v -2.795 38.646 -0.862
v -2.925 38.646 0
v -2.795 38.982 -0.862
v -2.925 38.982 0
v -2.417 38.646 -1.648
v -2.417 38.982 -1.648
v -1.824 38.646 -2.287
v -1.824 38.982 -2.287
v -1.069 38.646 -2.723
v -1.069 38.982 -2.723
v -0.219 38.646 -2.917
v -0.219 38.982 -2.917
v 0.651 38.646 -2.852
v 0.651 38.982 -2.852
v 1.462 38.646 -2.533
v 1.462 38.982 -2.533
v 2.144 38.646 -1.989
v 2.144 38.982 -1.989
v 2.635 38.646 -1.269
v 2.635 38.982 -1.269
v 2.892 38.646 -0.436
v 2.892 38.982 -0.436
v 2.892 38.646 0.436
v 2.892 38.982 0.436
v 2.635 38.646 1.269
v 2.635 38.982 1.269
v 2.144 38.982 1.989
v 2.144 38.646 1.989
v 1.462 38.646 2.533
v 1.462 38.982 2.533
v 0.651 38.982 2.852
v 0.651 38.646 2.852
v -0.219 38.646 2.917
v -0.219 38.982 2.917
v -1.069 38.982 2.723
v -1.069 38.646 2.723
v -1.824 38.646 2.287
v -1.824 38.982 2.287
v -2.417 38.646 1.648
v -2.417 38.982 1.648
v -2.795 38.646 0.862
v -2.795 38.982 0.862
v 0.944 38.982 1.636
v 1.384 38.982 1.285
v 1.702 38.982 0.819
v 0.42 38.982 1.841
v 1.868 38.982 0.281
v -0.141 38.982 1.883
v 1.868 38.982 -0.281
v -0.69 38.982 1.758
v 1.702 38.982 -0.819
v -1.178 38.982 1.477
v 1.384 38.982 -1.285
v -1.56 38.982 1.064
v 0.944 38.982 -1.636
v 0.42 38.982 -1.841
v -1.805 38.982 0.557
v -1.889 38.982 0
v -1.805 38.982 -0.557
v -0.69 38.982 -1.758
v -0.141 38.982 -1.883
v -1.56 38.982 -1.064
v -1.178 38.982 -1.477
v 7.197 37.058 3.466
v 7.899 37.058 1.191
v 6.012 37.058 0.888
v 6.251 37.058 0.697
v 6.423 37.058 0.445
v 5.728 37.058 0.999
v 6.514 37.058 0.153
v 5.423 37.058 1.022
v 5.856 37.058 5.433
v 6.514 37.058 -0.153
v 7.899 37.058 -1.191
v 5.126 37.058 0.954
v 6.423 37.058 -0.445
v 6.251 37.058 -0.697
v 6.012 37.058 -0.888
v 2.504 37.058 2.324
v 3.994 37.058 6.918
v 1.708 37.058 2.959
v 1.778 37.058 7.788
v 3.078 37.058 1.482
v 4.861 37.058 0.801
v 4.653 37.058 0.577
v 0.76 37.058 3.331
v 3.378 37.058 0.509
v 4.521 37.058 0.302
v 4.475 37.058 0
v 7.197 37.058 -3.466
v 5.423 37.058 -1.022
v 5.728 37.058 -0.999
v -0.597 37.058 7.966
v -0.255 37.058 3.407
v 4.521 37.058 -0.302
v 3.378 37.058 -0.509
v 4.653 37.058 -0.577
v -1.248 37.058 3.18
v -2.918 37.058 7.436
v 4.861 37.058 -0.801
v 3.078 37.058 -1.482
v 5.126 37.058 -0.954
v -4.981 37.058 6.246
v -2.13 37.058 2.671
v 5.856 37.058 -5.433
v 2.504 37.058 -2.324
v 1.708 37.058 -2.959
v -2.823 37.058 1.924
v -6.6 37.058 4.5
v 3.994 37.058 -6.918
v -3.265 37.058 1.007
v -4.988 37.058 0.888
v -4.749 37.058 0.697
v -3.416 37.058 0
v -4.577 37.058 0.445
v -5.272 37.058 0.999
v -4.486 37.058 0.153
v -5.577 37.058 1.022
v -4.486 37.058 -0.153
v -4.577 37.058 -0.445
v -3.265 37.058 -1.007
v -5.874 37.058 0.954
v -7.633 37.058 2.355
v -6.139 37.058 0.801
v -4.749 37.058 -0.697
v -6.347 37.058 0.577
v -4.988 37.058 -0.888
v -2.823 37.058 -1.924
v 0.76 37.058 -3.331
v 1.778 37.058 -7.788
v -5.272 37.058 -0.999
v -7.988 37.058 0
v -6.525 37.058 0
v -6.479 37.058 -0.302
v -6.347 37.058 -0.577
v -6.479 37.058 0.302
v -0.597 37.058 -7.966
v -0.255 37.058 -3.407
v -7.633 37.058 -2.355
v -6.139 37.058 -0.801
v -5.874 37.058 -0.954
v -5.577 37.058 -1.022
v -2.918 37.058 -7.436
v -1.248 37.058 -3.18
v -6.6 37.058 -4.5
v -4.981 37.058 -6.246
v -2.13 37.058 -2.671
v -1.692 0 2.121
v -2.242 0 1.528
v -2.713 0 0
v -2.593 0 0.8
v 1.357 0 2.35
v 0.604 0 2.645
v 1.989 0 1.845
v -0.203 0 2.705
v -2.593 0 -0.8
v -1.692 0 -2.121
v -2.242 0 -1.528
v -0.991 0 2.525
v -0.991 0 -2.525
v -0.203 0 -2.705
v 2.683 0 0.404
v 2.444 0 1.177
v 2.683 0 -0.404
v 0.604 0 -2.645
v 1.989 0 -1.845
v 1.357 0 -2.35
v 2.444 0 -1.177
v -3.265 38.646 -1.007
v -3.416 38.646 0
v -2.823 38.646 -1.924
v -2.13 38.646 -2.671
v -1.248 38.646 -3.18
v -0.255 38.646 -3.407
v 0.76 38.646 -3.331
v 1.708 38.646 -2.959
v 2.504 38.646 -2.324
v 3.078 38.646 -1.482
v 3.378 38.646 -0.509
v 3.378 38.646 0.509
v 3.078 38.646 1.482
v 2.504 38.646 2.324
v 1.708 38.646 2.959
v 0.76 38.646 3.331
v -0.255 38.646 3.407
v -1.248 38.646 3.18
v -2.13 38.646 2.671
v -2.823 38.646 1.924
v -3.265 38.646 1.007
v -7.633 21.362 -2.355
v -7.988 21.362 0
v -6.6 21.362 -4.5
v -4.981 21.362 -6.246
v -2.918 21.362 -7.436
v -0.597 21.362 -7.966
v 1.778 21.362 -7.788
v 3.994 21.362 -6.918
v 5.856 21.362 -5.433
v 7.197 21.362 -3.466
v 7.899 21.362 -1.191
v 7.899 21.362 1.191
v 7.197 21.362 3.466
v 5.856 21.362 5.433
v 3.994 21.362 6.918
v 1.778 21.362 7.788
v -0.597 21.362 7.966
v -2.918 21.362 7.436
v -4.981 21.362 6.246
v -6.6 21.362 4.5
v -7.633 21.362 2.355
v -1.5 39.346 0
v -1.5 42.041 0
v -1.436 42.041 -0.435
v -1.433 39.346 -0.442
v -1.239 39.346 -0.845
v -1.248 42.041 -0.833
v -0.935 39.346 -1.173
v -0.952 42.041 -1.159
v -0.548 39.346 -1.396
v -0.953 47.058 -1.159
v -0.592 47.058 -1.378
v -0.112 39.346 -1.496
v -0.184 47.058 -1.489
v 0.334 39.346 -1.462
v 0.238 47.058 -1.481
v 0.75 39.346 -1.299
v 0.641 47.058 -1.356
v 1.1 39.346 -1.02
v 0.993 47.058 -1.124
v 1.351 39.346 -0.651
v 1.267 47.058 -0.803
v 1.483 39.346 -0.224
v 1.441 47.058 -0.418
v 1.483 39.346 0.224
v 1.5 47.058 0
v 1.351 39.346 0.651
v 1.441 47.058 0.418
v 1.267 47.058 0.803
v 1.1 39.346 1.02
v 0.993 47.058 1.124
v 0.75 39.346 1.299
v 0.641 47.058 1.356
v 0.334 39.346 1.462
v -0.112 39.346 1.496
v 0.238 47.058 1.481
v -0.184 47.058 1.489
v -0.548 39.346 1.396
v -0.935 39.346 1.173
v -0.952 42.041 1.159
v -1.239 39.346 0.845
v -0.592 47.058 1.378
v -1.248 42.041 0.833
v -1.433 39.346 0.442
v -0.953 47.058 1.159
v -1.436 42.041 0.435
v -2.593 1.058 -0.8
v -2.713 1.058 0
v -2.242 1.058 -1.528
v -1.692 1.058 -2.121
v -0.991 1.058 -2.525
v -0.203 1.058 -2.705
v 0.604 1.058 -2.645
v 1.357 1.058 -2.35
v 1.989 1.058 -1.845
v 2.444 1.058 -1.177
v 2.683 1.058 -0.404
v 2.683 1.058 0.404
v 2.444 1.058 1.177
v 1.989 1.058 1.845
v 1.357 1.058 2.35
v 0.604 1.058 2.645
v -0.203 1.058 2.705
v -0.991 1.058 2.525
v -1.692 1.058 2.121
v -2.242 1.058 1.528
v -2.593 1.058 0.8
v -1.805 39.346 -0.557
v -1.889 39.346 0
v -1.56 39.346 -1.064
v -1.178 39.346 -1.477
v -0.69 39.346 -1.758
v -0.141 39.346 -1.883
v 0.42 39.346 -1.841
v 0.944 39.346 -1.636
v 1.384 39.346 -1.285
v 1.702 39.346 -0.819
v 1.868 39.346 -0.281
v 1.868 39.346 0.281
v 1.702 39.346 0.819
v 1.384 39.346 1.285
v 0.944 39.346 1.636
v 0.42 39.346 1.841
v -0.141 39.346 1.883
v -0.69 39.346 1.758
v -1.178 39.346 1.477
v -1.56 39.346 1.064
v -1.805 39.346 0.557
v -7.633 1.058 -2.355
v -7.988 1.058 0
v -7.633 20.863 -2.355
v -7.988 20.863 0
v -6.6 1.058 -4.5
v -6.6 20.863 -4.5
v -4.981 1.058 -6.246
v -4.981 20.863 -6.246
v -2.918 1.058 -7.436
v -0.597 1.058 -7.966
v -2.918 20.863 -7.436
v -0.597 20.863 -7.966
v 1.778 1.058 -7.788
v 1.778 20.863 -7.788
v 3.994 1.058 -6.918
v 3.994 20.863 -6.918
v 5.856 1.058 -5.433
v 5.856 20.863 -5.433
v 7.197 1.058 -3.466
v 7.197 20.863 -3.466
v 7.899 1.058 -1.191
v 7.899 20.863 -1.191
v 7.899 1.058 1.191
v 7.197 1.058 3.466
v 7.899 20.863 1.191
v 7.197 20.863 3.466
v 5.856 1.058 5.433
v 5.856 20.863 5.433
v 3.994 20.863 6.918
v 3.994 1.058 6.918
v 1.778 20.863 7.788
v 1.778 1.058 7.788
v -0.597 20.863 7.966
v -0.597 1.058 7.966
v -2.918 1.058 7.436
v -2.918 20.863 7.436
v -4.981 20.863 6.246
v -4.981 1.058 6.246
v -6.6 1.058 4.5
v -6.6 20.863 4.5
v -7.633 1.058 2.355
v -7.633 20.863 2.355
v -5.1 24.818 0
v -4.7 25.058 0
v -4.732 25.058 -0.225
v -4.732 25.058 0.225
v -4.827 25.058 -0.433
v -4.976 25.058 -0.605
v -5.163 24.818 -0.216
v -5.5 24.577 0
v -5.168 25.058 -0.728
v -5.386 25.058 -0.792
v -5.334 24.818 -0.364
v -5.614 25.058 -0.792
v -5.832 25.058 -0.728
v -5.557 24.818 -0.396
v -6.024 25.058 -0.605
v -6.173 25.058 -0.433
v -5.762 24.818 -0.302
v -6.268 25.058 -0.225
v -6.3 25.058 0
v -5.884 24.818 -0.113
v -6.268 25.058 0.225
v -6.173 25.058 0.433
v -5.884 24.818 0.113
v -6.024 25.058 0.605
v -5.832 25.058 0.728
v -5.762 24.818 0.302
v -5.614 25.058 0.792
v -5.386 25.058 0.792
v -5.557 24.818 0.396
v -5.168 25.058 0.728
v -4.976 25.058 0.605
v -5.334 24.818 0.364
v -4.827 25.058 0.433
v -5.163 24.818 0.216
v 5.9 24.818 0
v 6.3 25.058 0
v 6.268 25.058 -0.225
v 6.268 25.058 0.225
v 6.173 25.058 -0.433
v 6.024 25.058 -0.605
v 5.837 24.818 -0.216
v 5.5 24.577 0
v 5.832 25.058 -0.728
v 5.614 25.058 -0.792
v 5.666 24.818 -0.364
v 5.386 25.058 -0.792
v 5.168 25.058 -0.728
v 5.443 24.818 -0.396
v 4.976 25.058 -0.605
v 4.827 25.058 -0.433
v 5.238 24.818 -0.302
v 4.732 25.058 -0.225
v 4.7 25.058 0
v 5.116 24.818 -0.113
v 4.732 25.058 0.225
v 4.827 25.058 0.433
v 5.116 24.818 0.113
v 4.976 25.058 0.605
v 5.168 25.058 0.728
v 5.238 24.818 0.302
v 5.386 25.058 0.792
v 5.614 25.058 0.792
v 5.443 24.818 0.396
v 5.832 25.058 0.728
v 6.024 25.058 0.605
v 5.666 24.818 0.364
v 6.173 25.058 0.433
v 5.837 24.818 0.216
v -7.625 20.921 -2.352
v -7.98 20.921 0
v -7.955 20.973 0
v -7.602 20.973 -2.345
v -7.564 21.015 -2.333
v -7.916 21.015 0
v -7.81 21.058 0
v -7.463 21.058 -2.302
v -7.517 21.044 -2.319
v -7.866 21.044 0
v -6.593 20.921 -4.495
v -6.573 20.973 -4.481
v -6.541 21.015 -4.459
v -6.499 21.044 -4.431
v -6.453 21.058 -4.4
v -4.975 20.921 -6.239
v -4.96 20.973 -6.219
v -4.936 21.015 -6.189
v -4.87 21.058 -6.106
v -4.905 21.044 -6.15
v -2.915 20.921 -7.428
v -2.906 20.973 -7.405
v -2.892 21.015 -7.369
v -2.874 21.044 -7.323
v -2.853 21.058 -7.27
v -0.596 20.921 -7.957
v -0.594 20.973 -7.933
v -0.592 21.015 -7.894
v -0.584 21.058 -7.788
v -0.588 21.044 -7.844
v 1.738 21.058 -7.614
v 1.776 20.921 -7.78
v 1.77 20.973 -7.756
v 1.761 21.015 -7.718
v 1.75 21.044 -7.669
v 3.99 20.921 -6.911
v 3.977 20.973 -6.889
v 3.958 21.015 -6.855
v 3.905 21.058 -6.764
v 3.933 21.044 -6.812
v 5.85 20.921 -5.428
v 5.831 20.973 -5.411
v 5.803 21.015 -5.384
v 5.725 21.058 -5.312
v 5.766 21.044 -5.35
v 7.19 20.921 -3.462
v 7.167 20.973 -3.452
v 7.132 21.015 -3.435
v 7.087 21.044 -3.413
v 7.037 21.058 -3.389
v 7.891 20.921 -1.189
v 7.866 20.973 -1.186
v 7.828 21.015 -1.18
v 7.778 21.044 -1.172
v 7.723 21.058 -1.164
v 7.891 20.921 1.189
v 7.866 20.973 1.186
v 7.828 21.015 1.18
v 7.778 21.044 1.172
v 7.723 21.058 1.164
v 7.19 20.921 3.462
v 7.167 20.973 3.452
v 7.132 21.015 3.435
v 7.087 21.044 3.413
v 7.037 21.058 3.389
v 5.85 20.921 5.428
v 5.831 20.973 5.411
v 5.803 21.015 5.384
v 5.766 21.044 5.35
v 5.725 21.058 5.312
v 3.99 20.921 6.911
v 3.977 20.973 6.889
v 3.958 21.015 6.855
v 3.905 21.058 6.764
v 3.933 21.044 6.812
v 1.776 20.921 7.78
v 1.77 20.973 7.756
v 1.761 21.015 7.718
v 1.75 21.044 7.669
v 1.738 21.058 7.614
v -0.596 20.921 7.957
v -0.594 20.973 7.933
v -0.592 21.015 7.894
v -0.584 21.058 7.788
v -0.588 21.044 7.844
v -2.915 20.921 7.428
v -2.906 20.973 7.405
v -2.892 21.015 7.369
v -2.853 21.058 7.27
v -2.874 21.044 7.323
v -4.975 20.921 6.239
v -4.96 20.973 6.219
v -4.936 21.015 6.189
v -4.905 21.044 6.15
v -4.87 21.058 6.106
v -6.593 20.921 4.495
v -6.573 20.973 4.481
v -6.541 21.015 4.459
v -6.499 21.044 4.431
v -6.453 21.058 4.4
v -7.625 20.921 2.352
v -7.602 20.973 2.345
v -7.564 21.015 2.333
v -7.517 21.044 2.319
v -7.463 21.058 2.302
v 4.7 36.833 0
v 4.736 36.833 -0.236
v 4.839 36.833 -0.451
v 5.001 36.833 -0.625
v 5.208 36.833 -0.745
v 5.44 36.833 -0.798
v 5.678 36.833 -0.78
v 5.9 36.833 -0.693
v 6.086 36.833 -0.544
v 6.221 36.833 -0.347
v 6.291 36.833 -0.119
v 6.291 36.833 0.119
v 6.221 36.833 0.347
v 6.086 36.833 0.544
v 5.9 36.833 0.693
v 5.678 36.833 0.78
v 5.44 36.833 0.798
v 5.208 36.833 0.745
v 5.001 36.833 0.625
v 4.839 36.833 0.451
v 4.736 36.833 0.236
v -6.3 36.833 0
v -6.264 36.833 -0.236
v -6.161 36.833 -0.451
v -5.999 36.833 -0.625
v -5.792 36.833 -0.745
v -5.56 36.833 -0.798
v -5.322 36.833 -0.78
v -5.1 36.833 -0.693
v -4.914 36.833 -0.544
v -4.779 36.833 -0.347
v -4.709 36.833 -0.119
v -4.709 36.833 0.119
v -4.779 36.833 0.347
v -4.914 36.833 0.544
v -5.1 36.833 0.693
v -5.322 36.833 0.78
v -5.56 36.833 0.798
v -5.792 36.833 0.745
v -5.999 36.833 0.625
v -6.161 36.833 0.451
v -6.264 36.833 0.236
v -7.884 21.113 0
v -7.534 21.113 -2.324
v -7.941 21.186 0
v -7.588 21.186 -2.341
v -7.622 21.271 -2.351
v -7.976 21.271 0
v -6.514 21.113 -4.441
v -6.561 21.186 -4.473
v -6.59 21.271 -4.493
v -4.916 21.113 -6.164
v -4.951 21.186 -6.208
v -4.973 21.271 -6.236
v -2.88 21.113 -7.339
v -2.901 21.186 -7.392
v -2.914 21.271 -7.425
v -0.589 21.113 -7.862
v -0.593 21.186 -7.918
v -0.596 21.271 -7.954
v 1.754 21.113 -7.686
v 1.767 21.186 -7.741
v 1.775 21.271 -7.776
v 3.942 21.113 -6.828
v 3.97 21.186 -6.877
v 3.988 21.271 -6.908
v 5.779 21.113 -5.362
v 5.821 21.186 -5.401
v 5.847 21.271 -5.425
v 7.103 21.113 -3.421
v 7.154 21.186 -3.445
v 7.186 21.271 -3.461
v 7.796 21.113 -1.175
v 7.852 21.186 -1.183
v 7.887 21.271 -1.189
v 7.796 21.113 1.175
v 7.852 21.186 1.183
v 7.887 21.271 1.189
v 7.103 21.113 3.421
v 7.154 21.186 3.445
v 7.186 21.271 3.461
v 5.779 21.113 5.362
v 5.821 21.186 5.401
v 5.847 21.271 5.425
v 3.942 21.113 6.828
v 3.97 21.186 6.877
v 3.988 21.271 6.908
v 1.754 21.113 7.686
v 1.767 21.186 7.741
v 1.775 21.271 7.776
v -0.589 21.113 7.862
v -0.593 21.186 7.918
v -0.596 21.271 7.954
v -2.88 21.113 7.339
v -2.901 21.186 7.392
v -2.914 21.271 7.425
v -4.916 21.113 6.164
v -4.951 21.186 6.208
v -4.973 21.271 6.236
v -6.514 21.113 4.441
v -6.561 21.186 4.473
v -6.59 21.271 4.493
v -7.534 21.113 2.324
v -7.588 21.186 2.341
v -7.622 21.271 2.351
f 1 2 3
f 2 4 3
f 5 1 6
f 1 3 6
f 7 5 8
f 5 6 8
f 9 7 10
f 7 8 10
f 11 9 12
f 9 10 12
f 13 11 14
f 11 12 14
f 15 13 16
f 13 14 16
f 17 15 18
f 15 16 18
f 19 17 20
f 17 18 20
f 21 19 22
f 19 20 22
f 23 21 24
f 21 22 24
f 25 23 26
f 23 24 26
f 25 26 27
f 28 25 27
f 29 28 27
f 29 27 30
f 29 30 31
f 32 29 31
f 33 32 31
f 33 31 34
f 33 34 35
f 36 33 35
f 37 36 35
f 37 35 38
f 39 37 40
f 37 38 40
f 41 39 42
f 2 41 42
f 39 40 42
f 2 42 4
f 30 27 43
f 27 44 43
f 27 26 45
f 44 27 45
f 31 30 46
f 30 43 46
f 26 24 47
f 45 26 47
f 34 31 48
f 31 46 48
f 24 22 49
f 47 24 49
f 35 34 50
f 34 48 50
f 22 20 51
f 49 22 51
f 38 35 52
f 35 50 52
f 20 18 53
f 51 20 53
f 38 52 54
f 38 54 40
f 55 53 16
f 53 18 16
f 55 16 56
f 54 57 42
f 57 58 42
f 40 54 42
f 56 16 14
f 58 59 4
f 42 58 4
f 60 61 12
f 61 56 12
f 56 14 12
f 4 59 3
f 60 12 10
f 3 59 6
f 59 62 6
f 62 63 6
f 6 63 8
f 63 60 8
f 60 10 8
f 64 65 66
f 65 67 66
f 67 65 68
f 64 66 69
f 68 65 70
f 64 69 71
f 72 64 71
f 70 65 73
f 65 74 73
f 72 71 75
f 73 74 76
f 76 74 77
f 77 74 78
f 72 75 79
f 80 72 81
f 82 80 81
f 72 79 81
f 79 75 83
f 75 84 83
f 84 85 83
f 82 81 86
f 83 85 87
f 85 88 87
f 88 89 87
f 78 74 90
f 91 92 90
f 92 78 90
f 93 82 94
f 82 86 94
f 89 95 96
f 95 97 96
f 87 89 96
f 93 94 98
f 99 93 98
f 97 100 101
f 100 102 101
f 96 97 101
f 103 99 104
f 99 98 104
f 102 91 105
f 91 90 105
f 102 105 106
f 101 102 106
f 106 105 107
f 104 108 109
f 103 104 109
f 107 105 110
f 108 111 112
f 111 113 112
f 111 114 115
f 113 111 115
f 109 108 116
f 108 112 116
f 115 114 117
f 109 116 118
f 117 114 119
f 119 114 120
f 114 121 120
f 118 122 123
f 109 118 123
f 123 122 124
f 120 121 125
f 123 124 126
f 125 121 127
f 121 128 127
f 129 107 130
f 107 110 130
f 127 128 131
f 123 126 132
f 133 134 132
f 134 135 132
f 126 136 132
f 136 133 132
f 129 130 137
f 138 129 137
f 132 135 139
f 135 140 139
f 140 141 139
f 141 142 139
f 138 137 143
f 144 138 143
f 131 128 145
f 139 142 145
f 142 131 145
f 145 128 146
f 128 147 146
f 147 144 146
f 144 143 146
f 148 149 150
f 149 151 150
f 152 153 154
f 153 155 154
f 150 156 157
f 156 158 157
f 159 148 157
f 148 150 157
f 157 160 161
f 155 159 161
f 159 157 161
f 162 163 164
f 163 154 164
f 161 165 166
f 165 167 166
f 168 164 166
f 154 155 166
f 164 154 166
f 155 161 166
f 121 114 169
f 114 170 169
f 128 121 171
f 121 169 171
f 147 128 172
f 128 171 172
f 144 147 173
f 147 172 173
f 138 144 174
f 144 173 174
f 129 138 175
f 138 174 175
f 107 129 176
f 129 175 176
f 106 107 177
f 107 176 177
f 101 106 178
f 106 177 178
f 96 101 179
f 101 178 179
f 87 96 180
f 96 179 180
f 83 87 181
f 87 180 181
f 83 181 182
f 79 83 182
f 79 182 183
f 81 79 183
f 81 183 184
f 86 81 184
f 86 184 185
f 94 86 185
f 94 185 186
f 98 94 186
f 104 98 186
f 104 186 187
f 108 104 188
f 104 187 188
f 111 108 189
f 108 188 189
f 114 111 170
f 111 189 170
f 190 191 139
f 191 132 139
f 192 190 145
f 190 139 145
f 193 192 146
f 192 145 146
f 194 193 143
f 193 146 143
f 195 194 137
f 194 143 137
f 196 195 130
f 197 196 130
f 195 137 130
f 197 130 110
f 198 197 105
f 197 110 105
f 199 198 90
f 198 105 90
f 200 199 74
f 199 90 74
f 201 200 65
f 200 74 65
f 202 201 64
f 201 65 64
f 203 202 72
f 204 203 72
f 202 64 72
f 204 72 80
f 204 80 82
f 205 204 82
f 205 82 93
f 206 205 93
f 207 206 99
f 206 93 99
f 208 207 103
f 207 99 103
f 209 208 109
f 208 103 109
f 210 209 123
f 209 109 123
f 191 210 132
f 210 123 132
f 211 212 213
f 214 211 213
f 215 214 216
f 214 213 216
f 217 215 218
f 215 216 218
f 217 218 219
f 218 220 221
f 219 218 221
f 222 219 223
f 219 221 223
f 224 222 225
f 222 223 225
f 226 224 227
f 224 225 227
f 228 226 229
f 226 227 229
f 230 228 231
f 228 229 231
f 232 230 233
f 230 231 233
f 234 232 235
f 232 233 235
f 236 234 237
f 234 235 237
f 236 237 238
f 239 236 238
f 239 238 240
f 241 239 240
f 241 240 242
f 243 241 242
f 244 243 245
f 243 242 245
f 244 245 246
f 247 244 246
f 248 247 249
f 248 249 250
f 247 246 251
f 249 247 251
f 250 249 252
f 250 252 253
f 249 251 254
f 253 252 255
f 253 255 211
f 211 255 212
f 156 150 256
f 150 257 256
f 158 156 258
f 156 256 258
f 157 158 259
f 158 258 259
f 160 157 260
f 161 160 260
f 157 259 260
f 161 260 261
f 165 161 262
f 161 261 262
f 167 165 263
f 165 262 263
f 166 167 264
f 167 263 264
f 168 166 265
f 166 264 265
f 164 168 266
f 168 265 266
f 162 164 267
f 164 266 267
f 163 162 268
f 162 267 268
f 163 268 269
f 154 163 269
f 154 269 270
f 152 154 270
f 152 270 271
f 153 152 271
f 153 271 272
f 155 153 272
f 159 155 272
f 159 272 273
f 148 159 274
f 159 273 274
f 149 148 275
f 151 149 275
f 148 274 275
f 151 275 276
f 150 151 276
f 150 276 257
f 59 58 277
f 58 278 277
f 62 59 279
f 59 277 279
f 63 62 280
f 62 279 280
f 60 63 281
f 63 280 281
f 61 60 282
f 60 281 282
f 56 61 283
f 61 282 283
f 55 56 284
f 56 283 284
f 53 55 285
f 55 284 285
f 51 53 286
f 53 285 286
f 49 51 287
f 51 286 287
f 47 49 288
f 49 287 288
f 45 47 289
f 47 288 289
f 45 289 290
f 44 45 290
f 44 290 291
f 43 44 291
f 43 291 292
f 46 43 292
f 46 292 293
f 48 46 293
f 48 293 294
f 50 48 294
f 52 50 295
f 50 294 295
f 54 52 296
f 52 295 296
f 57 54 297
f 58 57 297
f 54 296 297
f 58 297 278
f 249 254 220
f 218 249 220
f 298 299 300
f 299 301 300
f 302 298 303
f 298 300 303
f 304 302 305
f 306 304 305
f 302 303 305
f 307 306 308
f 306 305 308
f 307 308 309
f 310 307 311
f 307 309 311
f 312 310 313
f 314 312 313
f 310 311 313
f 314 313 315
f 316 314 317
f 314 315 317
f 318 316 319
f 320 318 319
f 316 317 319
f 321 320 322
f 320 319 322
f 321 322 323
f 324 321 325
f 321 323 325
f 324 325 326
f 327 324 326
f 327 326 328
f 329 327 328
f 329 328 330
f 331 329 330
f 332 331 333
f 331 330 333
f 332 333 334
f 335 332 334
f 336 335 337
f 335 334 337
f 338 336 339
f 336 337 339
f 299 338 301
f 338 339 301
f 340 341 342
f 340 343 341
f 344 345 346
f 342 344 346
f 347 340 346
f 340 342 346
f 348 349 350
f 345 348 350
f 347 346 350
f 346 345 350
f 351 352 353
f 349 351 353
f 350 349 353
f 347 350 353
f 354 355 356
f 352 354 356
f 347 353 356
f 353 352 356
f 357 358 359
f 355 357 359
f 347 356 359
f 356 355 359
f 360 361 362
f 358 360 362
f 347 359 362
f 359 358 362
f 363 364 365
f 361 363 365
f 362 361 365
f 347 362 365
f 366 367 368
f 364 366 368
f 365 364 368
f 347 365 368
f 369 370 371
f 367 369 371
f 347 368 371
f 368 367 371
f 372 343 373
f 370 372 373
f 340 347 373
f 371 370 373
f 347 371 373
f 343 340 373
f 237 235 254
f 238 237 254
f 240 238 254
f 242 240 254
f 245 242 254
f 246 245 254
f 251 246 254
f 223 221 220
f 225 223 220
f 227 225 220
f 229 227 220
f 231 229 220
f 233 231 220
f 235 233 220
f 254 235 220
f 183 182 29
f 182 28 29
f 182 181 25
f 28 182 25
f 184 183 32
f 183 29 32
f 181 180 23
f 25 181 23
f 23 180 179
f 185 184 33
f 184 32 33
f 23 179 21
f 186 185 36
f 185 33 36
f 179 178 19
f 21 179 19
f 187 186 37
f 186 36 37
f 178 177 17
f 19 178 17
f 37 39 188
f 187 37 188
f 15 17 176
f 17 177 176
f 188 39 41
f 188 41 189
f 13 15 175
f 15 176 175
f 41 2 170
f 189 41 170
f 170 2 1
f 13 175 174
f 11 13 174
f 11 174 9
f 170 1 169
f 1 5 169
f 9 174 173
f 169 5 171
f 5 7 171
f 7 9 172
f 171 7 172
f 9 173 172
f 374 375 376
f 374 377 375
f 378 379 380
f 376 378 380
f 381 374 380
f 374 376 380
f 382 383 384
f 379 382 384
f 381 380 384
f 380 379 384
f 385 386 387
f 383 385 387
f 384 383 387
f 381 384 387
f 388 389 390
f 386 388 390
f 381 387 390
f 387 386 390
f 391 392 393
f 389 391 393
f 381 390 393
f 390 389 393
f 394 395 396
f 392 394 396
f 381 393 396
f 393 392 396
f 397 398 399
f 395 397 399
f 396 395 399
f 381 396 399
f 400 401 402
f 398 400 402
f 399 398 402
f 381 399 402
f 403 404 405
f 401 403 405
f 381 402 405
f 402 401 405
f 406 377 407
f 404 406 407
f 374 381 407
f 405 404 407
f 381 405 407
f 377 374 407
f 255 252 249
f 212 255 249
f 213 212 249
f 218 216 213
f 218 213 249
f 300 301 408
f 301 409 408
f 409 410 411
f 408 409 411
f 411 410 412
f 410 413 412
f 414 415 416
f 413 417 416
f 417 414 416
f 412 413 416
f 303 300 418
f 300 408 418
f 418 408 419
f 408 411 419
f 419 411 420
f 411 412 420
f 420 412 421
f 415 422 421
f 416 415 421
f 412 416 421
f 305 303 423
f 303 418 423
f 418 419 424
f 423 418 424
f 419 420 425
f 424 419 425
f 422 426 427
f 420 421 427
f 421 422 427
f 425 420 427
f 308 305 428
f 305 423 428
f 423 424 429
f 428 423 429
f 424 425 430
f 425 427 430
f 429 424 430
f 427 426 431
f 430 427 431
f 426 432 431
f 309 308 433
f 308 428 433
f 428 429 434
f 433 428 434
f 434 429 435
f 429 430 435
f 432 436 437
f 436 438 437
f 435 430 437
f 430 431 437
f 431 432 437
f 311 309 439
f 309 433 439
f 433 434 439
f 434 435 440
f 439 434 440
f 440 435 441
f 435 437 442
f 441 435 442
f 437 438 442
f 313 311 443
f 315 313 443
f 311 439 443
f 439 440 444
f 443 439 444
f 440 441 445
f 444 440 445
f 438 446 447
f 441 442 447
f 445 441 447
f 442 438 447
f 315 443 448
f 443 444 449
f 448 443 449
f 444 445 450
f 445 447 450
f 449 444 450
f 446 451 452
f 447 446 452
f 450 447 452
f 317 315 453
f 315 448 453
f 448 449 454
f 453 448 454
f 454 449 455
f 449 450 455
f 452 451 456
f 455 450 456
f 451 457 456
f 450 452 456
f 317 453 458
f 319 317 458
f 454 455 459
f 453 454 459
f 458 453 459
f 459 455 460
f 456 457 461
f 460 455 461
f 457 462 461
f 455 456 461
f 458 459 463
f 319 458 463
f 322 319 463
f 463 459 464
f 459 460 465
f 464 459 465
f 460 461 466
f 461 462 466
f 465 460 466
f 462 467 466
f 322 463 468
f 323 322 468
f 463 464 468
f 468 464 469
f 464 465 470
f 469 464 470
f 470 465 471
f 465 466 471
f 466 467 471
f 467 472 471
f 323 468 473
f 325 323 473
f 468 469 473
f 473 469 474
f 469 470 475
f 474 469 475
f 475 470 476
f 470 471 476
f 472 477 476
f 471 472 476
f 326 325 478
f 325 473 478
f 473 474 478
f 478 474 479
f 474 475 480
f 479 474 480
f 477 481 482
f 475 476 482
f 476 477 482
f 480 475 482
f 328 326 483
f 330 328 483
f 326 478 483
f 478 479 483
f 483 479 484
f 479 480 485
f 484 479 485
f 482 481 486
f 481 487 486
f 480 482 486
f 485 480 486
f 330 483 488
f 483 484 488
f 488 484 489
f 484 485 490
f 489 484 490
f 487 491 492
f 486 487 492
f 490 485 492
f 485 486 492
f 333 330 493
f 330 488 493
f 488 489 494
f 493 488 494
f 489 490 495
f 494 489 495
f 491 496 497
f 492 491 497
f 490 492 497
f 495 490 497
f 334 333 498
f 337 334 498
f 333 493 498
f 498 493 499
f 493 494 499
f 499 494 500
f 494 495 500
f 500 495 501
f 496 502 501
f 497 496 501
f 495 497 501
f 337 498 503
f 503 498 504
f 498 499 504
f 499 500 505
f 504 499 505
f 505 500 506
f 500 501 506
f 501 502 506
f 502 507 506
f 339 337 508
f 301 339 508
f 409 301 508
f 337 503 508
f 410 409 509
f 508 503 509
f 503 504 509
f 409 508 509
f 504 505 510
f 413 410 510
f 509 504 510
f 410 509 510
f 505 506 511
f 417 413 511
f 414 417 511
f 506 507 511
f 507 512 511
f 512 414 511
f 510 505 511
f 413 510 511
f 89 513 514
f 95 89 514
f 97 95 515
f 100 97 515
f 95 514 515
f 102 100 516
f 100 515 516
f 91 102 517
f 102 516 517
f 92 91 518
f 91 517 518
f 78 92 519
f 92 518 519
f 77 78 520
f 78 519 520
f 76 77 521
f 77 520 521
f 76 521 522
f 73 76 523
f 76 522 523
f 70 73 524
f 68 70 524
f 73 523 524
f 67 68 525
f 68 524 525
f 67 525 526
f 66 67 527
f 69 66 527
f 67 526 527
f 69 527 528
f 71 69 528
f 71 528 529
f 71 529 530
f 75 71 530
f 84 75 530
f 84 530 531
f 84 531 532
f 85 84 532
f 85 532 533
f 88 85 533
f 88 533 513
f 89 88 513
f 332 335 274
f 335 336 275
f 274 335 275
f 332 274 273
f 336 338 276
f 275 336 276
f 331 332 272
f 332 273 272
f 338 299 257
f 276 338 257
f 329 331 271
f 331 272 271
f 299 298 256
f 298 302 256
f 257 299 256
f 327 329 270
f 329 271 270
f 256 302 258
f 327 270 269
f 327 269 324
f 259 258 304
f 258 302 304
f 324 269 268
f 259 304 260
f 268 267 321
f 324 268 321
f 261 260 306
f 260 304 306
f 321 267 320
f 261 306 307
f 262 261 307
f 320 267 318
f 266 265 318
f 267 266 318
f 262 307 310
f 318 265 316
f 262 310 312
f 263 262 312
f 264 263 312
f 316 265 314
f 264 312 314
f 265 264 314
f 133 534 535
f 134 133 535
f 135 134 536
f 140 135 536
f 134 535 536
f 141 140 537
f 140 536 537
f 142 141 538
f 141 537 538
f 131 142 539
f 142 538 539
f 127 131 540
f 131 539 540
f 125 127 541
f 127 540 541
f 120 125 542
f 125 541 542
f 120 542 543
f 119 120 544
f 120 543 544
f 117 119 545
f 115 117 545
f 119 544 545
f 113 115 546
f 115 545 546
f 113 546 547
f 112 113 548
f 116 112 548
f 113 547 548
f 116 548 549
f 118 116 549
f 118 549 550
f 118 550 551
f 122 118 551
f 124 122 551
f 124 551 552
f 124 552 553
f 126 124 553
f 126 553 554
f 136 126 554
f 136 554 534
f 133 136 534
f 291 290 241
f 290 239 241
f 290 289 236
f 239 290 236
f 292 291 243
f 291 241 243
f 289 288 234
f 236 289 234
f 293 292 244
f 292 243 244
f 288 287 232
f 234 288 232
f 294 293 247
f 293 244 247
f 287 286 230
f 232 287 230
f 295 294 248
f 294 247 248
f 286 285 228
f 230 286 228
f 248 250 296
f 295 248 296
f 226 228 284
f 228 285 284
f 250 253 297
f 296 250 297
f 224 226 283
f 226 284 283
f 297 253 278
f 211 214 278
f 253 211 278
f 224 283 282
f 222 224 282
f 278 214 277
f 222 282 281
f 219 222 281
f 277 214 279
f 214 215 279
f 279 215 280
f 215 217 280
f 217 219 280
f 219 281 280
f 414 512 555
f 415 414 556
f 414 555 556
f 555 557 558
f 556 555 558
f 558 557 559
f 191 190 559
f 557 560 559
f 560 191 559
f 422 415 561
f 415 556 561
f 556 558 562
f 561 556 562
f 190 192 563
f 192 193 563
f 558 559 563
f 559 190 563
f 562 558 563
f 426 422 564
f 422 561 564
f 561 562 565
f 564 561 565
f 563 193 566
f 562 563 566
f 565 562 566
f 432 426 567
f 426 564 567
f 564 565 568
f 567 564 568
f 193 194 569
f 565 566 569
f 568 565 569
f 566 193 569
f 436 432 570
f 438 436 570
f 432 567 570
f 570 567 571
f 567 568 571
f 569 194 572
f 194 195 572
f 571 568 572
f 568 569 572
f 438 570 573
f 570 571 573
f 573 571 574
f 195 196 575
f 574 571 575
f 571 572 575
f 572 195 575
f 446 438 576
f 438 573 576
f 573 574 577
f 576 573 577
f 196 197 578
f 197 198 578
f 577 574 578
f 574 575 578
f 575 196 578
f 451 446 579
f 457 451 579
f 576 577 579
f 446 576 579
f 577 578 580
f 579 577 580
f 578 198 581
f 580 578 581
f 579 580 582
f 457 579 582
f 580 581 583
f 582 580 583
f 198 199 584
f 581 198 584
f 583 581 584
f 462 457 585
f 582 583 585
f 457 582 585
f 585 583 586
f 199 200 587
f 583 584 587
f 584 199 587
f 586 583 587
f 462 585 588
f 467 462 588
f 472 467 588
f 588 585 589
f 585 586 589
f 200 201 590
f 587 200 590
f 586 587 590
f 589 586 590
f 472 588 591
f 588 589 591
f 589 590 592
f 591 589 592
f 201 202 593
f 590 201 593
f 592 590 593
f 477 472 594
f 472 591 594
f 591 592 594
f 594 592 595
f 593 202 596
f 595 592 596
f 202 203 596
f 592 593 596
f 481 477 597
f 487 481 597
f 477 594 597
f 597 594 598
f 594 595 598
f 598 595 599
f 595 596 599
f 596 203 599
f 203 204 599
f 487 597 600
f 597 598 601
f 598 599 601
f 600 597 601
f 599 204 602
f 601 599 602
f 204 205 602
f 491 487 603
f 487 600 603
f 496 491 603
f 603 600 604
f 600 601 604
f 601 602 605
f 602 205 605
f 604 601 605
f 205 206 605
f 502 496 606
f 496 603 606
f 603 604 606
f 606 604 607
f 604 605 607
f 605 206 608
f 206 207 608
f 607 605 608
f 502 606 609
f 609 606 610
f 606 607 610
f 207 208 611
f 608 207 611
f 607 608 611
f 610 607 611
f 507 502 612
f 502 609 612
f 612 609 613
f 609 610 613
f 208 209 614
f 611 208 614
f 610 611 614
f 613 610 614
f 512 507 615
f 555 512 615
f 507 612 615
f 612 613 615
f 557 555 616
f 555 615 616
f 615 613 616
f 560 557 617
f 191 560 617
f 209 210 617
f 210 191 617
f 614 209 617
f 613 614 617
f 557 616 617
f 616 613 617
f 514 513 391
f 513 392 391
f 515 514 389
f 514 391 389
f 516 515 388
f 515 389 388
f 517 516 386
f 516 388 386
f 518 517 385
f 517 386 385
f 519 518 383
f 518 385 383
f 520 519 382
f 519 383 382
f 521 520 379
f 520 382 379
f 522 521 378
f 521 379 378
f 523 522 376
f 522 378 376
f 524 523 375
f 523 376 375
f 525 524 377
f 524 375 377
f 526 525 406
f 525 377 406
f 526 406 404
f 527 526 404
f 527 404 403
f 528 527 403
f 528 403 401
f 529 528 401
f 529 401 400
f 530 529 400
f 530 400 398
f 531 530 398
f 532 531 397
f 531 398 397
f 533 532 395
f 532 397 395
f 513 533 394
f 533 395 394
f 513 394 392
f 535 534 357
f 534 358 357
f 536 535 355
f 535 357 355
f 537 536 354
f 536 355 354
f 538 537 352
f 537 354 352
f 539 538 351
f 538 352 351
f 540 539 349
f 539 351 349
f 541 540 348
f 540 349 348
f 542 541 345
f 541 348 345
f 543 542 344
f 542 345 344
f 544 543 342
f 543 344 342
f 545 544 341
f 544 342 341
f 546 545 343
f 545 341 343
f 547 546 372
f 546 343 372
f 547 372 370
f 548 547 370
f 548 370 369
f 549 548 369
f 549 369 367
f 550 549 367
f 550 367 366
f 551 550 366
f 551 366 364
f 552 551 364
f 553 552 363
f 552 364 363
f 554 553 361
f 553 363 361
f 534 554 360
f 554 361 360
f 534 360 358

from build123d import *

# Parameters (mm, degrees)
M2X0_4_TAPPED_HOLE1_D           = 1.6
M2X0_4_TAPPED_HOLE1_DEPTH       = 12.0000014
M2X0_4_TAPPED_HOLE1_CSINK_D     = 2.05
M2X0_4_TAPPED_HOLE1_CSINK_ANGLE = 90
M2X0_4_TAPPED_HOLE1_TIP         = 0.480688495
CUT_EXTRUDE1_DEPTH              = 5.0165


with BuildPart() as part:
    # Sketch2 → Revolve1 (revolve)
    with BuildSketch(Plane.XY):
        with BuildLine():
            Line((0, 0), (2.713042009, 0))
            Line((2.713042009, 0), (2.713042009, 1.057855461))
            Line((2.713042009, 1.057855461), (7.9883, 1.057855461))
            Line((7.9883, 1.057855461), (7.9883, 20.863496467))
            ThreePointArc((7.9883, 20.863496467), (7.937074629, 20.995273421), (7.810296505, 21.057855461))
            ThreePointArc((7.810296505, 21.057855461), (7.9405339, 21.185977007), (7.9883, 21.362315629))
            Line((7.9883, 21.362315629), (7.9883, 37.057855461))
            Line((7.9883, 37.057855461), (3.4163, 37.057855461))
            Line((3.4163, 37.057855461), (3.4163, 38.64639819))
            Line((3.4163, 38.64639819), (2.924863894, 38.64639819))
            Line((2.924863894, 38.64639819), (2.924863894, 38.982086399))
            Line((2.924863894, 38.982086399), (1.888599244, 38.982086399))
            Line((1.888599244, 38.982086399), (1.888599244, 39.34639819))
            Line((1.888599244, 39.34639819), (1.5, 39.34639819))
            Line((1.5, 39.34639819), (1.5, 47.057855461))
            Line((1.5, 47.057855461), (0, 47.057855461))
            Line((0, 47.057855461), (0, 0))
        make_face()
    revolve(axis=Axis((0, 47.057855461, 0), (0, -1, 0)))

    # M2x0.4 Tapped Hole1
    with Locations(Plane(origin=(0, 37.057855461, 0), x_dir=(1, 0, 0), z_dir=(0, 1, 0))):
        with Locations((-5.5, 0), (5.5, 0)):
            CounterSinkHole(M2X0_4_TAPPED_HOLE1_D / 2, M2X0_4_TAPPED_HOLE1_CSINK_D / 2, depth=M2X0_4_TAPPED_HOLE1_DEPTH, counter_sink_angle=M2X0_4_TAPPED_HOLE1_CSINK_ANGLE)
            with Locations((0, 0, -(M2X0_4_TAPPED_HOLE1_DEPTH + M2X0_4_TAPPED_HOLE1_TIP / 2))):  # 118° drill point
                Cone(0, M2X0_4_TAPPED_HOLE1_D / 2, M2X0_4_TAPPED_HOLE1_TIP, mode=Mode.SUBTRACT)

    # Sketch6 → Cut-Extrude1 (cut)
    with BuildSketch(Plane(origin=(0, 47.057855461, 0), x_dir=(1, 0, 0), z_dir=(0, 1, 0))):
        with BuildLine():
            ThreePointArc((-0.9525, 1.158768204), (-1.5, 0), (-0.9525, -1.158768204))
            Line((-0.9525, -1.158768204), (-0.9525, 1.158768204))
        make_face()
    extrude(amount=-CUT_EXTRUDE1_DEPTH, mode=Mode.SUBTRACT)


solid = part.part
